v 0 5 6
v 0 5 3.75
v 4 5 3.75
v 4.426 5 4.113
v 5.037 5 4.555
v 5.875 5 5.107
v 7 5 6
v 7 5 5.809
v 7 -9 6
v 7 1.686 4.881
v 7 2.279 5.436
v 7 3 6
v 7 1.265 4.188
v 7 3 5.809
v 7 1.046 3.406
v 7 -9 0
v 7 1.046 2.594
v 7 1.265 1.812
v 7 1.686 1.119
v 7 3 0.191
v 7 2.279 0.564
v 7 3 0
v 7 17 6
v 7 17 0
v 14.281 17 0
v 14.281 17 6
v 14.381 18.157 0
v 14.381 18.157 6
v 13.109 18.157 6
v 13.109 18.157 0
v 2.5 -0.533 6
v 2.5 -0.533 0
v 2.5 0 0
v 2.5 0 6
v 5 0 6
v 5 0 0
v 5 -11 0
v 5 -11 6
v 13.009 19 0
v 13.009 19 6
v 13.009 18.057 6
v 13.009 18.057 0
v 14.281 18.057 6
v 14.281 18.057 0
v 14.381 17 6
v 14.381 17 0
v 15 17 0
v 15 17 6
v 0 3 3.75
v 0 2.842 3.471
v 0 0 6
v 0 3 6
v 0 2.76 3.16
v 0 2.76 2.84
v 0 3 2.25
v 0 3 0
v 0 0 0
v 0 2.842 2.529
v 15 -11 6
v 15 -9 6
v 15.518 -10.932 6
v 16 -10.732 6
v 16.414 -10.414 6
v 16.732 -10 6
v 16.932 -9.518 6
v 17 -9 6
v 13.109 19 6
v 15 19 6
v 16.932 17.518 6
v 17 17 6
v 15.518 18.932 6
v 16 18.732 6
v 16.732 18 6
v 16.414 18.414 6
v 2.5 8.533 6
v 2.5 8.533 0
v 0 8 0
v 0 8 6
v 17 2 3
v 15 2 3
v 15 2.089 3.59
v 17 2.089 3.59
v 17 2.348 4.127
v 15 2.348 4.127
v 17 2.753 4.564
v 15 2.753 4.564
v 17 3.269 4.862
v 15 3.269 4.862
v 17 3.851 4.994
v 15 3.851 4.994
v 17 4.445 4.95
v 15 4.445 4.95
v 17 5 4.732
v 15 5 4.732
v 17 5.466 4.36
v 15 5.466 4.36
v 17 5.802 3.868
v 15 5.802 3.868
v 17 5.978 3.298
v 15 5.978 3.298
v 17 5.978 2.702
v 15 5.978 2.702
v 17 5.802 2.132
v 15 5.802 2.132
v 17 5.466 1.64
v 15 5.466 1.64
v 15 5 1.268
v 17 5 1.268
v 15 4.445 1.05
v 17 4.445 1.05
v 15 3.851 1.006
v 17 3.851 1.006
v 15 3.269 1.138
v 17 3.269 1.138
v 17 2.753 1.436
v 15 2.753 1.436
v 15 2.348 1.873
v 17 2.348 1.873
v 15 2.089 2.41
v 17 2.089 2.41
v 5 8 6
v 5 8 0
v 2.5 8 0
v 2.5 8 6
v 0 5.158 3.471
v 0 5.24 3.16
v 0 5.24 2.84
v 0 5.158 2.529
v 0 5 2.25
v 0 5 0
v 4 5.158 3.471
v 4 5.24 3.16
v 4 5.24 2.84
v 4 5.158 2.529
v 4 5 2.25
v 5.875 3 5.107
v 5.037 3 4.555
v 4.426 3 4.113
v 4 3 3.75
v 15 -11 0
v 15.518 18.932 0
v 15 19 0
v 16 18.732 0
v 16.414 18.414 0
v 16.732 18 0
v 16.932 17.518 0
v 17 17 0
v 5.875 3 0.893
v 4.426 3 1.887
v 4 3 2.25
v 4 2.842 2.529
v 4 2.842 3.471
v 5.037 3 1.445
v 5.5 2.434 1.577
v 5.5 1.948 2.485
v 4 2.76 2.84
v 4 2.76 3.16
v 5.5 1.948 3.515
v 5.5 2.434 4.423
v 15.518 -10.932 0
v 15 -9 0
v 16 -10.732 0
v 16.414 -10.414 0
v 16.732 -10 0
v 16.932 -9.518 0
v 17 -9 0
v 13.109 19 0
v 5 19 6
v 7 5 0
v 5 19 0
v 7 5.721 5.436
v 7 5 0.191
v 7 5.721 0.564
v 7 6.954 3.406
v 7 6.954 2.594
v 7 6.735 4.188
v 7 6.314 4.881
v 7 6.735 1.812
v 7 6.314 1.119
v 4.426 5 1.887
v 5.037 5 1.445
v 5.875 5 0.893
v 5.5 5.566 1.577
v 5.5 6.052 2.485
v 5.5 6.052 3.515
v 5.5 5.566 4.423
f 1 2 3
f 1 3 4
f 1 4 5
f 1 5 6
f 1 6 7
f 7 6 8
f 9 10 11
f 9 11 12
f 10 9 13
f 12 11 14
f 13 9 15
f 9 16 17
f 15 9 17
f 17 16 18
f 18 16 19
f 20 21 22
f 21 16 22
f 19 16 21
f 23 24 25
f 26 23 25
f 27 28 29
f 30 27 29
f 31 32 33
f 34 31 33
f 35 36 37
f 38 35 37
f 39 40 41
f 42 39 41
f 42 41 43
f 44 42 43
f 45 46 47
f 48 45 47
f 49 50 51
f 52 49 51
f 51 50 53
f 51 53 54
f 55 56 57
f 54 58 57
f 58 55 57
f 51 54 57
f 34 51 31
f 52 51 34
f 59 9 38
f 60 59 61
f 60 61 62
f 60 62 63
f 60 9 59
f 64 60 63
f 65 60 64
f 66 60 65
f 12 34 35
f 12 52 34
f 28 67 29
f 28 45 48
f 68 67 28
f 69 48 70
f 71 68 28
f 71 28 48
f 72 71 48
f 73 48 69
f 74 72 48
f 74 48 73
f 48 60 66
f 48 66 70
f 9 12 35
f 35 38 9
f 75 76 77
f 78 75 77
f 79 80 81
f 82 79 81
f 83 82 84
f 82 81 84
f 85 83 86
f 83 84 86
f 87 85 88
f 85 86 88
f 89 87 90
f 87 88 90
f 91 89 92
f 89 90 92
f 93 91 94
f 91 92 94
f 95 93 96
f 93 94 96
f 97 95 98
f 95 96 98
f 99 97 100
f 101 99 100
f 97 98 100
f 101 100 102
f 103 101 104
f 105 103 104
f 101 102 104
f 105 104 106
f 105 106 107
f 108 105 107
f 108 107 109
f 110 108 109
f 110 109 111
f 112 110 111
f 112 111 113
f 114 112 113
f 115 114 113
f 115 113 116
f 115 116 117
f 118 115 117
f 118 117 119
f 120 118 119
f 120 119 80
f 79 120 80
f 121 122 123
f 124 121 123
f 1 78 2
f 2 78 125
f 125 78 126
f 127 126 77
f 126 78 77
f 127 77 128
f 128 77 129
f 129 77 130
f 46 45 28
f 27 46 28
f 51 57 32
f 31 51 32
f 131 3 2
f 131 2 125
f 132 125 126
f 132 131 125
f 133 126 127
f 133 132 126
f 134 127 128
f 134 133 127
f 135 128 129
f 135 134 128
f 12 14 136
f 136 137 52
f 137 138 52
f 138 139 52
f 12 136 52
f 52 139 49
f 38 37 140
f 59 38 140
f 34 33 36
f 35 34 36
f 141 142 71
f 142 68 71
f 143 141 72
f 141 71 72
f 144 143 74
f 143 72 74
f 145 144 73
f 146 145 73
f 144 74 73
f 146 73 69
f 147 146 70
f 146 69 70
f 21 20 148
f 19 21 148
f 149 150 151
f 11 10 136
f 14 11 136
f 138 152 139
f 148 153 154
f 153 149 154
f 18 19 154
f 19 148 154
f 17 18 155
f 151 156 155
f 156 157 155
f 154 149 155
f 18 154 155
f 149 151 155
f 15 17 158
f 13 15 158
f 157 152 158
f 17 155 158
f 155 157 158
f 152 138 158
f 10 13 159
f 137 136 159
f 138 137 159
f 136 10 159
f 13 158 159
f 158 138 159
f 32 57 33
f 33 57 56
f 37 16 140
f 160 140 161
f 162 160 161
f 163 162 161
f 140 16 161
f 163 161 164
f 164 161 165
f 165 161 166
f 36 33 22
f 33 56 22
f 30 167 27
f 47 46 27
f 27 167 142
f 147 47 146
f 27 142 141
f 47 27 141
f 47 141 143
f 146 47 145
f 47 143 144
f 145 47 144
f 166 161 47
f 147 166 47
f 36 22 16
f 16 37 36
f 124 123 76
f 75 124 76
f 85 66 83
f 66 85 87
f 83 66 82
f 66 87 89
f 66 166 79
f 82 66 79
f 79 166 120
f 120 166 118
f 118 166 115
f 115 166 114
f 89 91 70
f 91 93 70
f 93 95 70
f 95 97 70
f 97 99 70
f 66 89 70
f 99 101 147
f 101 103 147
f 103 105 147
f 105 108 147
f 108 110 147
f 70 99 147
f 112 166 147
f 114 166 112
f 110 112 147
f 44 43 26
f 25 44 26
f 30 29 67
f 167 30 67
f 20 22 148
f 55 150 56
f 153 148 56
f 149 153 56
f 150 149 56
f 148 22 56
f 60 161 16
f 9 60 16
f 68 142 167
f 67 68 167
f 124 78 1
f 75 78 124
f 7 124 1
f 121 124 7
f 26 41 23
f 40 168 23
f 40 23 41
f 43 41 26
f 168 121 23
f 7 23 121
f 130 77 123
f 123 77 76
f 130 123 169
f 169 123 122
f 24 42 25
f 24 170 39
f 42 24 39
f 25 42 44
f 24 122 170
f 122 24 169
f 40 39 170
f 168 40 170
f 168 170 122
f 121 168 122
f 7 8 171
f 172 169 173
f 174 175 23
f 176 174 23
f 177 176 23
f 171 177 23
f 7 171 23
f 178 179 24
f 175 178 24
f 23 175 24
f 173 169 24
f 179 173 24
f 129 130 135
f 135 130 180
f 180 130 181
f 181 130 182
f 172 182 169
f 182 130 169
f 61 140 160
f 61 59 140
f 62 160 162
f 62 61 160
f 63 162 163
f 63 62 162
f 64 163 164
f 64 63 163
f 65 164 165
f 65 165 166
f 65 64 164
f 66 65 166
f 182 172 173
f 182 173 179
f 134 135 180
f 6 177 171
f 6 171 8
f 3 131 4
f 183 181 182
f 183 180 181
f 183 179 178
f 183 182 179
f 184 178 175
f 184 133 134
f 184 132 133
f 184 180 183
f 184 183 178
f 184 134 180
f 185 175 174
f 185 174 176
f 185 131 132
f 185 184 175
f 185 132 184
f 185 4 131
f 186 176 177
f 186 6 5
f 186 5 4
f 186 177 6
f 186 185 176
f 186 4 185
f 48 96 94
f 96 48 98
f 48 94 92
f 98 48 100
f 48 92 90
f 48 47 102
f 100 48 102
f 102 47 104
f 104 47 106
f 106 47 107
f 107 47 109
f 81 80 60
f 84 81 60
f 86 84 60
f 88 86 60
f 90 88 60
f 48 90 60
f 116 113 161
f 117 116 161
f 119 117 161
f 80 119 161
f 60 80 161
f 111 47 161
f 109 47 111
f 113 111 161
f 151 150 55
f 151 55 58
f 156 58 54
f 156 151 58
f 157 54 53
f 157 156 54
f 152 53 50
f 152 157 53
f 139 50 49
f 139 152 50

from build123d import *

# Parameters (mm, degrees)
F1_DEPTH  = 6
F2_R      = 1.25
F3_DEPTH  = 25
F4_R      = 2
F5_DEPTH  = 25
F6_R      = 2
F7_SIZE2  = 3
F7_SIZE   = 1.7320508076
F8_SIZE2  = 3
F8_SIZE   = 1.7320508076
F10_DEPTH = 25


with BuildPart() as f1:
    # F0 (on Top) → F1 (new body)
    with BuildSketch(Plane.XY):
        Polygon((5, 8), (2.5, 8), (2.5, 8.5332244635), (0, 8), (0, 5), (5, 5), (7, 5), (7, 17), (15, 17), (15, 4), (15, -9), (7, -9), (7, 3), (5, 3), (0, 3), (0, 0), (2.5, -0.5332244635), (2.5, 0), (5, 0), (5, -11), (6.961800158, -11), (17, -11), (17, 4), (17, 19), (6.961800158, 19), (5, 19), align=None)
    extrude(amount=F1_DEPTH)

    # F2 (on face) → F3 (cut)
    with BuildSketch(Plane(origin=(15, 0, 0), x_dir=(0, -1, 0), z_dir=(-1, 0, 0))):
        with Locations((-4, 3)):
            Circle(F2_R)
    extrude(amount=F3_DEPTH, mode=Mode.SUBTRACT)

    # F4 (on face) → F5 (cut)
    with BuildSketch(Plane(origin=(15, 0, 0), x_dir=(0, -1, 0), z_dir=(-1, 0, 0))):
        with Locations((-4, 3)):
            Circle(F4_R)
    extrude(amount=-F5_DEPTH, mode=Mode.SUBTRACT)

    # F6
    f6_edges = [f1.edges().sort_by_distance(p)[0] for p in [
        (17, 19, 3),
        (17, -11, 3),
    ]]
    fillet(f6_edges, radius=F6_R)

    # F7
    f7_edges = [f1.edges().sort_by_distance(p)[0] for p in [
        (7, 5.25, 3),
    ]]
    f7_side = f1.faces().sort_by_distance((7, 11.021006, 3))[0]
    chamfer(f7_edges, length=F7_SIZE, length2=F7_SIZE2, reference=f7_side)

    # F8
    f8_edges = [f1.edges().sort_by_distance(p)[0] for p in [
        (7, 2.75, 3),
    ]]
    f8_side = f1.faces().sort_by_distance((7, -3.021006, 3))[0]
    chamfer(f8_edges, length=F8_SIZE, length2=F8_SIZE2, reference=f8_side)

    # F9 (on face) → F10 (cut)
    with BuildSketch(Plane.XY.offset(6)):
        Polygon((13.1088524893, 19), (13.0088524893, 19), (13.0088524893, 18.0567633361), (14.2809776589, 18.0567633361), (14.2809776589, 17), (14.3809776589, 17), (14.3809776589, 18.1567633361), (13.1088524893, 18.1567633361), align=None)
    extrude(amount=-F10_DEPTH, mode=Mode.SUBTRACT)


solid = f1.part
